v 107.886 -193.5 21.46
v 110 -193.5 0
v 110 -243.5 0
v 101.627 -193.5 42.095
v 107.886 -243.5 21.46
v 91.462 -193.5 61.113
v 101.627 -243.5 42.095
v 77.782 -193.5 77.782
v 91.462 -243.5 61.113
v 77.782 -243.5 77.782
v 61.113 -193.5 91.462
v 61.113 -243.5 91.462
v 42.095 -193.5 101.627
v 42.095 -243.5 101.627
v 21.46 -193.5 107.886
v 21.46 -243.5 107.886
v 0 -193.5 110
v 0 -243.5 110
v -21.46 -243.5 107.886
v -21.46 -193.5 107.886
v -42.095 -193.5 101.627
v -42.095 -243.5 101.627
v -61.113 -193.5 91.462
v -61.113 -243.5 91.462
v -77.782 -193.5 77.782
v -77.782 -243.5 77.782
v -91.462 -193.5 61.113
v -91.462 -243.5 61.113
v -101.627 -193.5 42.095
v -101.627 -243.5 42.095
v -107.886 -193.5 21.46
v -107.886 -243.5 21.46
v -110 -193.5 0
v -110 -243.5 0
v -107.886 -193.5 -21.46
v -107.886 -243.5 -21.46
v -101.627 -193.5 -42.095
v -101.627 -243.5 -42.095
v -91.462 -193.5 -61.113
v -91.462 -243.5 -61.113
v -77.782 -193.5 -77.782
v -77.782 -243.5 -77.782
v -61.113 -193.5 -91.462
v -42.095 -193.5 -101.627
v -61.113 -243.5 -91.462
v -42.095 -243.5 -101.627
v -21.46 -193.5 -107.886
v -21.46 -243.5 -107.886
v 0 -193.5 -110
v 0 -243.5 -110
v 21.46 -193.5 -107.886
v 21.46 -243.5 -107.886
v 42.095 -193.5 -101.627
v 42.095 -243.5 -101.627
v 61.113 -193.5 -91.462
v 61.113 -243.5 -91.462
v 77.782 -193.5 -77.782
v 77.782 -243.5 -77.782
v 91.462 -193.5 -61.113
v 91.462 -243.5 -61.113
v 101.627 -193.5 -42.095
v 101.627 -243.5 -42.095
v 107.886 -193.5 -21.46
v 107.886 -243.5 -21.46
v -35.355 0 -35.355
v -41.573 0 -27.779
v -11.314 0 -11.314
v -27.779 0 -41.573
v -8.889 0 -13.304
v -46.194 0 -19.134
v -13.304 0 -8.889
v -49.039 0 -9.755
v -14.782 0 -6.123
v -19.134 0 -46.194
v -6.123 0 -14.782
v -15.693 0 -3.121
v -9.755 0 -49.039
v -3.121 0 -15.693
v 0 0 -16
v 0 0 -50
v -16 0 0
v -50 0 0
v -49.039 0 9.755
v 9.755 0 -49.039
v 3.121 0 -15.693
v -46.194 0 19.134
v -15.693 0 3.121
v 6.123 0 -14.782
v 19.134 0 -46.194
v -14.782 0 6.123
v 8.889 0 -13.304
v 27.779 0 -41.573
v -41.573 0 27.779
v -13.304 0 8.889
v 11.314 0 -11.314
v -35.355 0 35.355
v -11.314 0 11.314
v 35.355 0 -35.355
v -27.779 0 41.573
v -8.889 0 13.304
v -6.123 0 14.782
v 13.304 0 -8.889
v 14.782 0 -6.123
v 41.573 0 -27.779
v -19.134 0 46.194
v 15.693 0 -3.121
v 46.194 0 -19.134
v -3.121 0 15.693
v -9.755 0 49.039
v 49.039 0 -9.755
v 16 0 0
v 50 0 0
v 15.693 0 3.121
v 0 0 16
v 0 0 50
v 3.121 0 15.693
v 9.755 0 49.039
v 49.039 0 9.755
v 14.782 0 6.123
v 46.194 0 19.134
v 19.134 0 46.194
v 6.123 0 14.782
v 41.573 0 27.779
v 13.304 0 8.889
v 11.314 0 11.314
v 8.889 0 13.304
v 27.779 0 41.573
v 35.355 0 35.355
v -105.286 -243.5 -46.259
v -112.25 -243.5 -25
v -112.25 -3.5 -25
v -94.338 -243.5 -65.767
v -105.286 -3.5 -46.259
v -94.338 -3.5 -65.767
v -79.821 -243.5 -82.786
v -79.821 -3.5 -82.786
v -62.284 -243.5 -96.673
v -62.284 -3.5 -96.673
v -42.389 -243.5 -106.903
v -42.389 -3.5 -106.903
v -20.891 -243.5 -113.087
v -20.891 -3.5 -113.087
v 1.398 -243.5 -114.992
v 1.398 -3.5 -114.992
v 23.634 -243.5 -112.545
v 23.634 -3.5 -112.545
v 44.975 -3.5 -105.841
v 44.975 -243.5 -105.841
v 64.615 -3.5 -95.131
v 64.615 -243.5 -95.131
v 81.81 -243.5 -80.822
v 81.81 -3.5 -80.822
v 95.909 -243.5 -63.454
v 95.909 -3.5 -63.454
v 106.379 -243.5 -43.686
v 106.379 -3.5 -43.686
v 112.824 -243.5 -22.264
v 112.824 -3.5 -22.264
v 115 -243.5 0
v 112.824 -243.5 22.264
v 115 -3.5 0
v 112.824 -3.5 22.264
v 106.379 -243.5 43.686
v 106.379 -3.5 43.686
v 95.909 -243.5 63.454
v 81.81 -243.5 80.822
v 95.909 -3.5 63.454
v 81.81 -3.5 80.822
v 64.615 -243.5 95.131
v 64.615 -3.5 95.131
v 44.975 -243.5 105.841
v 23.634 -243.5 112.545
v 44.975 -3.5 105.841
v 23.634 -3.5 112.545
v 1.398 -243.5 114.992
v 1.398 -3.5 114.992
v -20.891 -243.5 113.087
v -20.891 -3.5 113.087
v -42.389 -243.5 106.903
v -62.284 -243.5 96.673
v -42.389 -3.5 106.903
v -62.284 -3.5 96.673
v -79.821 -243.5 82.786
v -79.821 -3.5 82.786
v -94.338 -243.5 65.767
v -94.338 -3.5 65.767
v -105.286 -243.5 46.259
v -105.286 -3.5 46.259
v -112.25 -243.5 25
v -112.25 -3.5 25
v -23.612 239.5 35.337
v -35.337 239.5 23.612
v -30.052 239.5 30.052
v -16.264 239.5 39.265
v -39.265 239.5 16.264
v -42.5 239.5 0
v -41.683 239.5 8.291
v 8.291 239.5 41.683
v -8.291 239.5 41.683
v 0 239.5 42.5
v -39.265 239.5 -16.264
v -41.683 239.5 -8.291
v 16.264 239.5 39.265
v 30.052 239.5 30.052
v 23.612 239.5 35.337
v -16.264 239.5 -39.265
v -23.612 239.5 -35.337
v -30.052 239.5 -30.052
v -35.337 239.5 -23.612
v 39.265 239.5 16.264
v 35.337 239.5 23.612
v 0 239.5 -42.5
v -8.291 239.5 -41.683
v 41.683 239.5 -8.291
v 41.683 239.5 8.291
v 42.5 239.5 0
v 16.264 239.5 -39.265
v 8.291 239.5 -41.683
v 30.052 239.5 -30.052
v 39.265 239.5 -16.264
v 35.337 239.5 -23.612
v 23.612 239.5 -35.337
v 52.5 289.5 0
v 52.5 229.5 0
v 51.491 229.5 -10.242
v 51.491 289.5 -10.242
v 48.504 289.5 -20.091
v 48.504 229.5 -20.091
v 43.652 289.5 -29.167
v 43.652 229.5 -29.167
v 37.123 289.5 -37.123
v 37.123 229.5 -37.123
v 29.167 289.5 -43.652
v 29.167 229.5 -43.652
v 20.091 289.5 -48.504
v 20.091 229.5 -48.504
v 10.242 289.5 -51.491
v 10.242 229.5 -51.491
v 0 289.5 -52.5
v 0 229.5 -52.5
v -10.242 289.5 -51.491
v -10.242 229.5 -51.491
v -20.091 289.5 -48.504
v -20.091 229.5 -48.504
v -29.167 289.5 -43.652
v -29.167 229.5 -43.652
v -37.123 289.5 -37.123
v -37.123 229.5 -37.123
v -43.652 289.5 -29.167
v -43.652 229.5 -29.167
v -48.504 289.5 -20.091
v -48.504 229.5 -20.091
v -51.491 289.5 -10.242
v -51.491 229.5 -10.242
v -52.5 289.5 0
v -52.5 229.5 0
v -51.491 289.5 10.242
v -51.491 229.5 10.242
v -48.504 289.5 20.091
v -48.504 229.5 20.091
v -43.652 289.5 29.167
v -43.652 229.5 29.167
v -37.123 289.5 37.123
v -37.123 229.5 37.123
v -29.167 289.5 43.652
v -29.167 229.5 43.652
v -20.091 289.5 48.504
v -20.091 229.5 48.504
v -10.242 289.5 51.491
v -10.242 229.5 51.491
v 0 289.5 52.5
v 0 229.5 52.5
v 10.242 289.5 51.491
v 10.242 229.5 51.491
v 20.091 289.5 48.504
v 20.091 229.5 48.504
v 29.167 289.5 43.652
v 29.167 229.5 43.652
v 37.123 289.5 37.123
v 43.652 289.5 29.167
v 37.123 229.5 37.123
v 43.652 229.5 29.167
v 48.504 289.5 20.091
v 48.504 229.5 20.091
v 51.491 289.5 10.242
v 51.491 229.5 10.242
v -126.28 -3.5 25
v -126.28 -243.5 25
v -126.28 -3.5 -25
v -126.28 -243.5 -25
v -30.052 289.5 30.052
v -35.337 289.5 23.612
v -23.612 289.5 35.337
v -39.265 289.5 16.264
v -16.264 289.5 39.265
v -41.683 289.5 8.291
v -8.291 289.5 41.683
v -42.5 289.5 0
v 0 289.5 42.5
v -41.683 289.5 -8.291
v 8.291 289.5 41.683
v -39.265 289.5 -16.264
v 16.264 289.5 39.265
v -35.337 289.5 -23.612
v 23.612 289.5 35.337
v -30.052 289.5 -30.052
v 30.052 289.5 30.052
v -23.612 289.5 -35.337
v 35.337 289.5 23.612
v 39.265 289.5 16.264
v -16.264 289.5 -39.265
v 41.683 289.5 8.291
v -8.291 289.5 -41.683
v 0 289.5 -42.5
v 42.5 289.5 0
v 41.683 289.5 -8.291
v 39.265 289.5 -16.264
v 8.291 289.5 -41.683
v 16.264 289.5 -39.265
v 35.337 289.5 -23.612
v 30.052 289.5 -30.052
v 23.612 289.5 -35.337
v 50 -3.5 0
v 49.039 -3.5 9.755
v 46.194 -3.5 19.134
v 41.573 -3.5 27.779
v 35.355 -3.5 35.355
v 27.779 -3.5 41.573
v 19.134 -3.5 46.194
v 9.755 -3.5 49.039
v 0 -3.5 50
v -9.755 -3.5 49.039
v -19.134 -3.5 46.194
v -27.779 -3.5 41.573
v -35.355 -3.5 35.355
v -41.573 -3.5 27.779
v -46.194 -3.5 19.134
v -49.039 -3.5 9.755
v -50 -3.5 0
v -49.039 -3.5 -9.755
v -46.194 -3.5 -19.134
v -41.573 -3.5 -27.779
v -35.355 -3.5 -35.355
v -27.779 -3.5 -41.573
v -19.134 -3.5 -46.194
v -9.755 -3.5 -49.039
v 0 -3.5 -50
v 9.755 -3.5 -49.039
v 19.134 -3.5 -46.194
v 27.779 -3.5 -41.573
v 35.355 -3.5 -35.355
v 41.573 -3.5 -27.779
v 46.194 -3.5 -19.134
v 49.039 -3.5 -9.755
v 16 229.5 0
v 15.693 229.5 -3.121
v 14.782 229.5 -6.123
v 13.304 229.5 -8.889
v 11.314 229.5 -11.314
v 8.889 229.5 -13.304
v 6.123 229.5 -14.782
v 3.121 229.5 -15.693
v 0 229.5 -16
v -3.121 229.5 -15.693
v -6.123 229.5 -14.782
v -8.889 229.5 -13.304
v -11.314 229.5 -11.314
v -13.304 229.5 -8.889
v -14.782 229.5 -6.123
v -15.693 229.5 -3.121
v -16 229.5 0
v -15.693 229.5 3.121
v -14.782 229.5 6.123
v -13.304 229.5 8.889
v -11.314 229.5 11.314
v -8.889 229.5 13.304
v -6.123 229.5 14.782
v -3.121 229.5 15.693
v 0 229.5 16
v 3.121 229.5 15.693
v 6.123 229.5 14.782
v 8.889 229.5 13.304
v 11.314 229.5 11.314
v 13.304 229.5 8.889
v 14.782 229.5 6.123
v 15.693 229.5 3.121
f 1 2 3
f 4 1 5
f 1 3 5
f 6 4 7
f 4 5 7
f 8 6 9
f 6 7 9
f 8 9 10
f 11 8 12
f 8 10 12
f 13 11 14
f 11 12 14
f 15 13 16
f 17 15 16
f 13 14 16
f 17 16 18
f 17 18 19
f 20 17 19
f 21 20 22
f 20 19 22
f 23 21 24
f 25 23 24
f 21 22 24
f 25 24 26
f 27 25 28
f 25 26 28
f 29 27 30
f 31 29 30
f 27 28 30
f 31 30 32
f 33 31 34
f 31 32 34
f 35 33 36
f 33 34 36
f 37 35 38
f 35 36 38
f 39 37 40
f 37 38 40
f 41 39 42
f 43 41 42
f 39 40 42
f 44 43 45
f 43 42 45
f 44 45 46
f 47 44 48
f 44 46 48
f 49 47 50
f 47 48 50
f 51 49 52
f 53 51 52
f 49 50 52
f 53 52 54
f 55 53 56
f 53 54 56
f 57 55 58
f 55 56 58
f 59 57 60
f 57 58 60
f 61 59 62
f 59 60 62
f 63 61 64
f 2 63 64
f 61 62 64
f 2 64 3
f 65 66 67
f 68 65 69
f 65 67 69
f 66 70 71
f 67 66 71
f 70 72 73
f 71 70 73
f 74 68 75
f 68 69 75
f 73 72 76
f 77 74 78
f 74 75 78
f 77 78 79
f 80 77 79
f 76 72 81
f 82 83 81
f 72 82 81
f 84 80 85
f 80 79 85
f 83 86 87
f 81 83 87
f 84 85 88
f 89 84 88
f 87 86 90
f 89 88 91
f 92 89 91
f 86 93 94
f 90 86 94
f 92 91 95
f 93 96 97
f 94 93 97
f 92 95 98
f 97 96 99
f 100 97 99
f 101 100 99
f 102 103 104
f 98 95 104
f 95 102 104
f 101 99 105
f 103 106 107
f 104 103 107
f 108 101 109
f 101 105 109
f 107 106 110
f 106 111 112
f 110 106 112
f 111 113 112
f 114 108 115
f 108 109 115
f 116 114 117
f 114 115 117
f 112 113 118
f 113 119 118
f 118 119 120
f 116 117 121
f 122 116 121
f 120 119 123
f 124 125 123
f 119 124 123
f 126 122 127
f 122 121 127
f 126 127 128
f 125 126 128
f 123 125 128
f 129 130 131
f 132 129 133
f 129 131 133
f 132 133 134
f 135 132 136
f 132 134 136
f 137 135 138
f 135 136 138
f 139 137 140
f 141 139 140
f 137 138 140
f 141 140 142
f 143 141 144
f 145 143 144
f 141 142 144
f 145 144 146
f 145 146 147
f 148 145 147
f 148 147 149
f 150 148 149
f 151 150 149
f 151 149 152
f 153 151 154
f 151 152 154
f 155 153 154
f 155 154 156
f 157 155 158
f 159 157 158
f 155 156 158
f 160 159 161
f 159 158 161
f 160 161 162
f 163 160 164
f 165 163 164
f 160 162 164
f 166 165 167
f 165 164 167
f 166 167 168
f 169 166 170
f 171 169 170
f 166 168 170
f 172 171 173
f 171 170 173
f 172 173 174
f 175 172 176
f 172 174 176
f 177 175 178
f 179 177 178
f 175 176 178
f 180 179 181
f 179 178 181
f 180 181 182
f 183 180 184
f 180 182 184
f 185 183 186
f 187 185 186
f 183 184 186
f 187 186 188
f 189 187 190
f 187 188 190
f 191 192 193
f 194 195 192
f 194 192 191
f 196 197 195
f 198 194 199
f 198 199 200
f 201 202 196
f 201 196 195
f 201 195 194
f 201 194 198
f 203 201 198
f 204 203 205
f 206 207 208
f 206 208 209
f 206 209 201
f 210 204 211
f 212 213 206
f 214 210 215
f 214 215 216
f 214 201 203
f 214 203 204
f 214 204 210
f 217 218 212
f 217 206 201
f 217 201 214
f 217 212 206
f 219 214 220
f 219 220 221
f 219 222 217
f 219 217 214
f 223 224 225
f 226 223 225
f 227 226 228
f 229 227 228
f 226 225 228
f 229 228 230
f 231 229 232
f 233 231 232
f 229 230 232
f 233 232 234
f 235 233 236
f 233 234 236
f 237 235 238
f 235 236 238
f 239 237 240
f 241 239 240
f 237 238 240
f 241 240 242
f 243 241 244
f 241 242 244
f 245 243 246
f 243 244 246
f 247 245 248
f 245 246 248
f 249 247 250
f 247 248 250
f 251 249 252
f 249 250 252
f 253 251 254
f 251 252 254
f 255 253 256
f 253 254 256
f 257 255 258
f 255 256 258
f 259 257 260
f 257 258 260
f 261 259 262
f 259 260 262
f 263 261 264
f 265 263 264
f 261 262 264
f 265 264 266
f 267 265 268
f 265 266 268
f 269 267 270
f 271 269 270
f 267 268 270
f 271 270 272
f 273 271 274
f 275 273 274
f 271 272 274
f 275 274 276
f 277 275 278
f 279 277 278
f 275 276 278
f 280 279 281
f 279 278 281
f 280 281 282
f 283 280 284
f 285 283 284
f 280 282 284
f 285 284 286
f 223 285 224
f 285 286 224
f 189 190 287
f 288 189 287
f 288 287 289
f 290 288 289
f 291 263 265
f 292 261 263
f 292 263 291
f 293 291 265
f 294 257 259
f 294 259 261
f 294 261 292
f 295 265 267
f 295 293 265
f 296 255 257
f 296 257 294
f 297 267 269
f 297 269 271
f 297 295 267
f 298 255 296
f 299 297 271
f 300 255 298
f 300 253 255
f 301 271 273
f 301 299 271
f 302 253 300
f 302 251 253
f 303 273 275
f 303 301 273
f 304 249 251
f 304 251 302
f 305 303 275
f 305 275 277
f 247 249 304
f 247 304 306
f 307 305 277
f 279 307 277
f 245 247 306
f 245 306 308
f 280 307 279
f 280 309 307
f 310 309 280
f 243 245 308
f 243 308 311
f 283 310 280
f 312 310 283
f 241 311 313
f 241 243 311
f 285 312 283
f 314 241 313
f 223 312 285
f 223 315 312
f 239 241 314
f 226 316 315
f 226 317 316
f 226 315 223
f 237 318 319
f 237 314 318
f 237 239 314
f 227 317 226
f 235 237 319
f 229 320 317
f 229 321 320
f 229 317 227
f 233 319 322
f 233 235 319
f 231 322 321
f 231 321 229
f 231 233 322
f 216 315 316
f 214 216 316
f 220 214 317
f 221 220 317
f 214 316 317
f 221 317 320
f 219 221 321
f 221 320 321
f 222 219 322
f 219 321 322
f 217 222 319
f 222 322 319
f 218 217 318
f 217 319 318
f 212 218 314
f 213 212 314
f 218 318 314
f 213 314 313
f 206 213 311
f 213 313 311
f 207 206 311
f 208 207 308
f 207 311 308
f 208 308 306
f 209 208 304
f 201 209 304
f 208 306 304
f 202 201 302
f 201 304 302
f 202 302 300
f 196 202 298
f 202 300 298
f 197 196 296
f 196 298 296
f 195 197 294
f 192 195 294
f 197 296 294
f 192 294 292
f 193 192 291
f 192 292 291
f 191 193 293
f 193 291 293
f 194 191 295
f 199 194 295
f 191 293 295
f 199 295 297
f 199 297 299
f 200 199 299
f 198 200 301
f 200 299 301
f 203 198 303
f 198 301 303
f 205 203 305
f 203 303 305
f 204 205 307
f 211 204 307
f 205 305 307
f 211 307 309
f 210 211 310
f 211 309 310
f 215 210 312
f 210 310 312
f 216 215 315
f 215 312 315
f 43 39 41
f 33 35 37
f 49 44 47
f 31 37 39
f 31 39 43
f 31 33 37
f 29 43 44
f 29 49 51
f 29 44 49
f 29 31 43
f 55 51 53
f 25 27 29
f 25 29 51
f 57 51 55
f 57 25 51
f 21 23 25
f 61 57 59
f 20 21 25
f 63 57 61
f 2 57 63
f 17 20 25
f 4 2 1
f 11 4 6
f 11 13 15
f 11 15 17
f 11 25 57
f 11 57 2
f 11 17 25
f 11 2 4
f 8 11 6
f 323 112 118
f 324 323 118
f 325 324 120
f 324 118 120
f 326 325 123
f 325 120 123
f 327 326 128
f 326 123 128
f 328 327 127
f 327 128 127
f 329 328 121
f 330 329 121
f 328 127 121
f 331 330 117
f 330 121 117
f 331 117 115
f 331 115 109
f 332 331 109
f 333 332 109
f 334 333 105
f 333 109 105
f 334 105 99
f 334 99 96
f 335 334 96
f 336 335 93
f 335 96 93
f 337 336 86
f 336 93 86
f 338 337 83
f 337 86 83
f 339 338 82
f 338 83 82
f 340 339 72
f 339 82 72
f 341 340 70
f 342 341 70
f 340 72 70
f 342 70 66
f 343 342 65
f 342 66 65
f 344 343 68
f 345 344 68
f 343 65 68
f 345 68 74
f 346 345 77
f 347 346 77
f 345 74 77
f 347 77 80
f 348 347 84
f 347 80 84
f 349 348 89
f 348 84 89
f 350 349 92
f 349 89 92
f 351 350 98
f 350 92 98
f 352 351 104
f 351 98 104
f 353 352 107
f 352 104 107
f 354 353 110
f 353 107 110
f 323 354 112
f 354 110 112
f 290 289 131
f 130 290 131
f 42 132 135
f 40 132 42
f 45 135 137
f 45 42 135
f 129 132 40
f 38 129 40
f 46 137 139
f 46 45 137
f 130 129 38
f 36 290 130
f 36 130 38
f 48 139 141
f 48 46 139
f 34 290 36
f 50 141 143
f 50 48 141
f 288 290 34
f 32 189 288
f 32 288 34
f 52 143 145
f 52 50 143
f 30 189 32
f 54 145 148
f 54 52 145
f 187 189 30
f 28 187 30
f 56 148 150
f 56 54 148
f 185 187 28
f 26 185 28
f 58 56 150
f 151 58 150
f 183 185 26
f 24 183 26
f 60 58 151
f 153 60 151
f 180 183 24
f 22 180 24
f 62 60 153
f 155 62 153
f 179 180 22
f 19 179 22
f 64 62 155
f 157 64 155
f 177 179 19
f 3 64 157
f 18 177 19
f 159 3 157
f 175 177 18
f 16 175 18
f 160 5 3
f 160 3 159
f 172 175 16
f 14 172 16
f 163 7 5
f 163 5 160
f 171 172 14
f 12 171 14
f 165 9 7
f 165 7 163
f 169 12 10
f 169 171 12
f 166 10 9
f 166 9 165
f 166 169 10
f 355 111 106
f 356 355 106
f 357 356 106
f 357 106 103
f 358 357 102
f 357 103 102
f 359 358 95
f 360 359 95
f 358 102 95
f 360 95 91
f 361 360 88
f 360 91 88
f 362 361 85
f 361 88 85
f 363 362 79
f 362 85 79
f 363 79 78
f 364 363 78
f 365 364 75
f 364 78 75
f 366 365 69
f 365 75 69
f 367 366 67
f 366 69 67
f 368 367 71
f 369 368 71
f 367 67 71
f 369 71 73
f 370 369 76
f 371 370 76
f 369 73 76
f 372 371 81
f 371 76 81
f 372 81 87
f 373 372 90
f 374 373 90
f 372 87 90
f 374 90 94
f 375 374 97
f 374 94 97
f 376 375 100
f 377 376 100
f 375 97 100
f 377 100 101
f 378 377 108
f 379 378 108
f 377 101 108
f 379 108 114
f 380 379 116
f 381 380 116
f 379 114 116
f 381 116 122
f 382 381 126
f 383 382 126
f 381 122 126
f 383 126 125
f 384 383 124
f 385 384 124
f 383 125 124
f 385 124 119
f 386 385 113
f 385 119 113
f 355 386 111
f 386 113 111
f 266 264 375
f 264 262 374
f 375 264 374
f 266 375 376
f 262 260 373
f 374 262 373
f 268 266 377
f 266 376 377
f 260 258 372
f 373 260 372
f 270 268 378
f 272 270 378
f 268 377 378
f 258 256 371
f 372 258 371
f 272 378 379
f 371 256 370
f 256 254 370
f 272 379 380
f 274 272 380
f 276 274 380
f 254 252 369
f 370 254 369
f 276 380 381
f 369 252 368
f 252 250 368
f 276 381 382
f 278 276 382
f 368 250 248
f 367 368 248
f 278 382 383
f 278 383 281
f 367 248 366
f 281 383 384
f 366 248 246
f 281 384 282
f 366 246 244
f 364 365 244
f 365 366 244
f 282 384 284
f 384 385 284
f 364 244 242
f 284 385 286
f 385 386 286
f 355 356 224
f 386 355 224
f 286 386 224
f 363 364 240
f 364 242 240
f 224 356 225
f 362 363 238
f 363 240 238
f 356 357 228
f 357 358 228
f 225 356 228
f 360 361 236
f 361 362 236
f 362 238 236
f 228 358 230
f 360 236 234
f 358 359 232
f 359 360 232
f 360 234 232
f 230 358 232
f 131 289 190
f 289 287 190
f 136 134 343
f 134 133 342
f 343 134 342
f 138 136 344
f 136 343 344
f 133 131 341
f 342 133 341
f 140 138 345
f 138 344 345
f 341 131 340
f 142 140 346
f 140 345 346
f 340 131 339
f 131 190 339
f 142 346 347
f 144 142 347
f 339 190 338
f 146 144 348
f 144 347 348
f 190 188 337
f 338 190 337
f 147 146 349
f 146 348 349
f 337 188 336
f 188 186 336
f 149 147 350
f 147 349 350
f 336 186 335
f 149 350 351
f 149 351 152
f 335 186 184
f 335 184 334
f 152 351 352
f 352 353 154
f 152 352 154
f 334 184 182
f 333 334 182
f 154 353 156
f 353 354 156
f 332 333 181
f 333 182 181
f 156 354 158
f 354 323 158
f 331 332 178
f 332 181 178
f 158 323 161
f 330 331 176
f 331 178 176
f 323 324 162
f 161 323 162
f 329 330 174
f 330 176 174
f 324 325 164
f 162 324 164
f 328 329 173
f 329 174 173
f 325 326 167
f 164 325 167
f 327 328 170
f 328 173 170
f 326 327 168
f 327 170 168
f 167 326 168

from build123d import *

# Parameters (mm, degrees)
SKETCH1_R           = 16
BOSS_EXTRUDE1_DEPTH = 229.5
SKETCH2_R           = 52.5
BOSS_EXTRUDE2_DEPTH = 60
SKETCH3_R           = 42.5
CUT_EXTRUDE1_DEPTH  = 50
SKETCH6_R           = 50
BOSS_EXTRUDE4_DEPTH = 3.5
BOSS_EXTRUDE5_DEPTH = 240
SKETCH8_R           = 110
CUT_EXTRUDE3_DEPTH  = 50


with BuildPart() as part:
    # Sketch1 → Boss-Extrude1 (new body)
    with BuildSketch(Plane(origin=(0, 0, 0), x_dir=(1, 0, 0), z_dir=(0, 1, 0))):
        Circle(SKETCH1_R)
    extrude(amount=BOSS_EXTRUDE1_DEPTH)

    # Sketch2 → Boss-Extrude2 (add)
    with BuildSketch(Plane(origin=(0, 229.5, 0), x_dir=(1, 0, 0), z_dir=(0, 1, 0))):
        Circle(SKETCH2_R)
    extrude(amount=BOSS_EXTRUDE2_DEPTH)

    # Sketch3 → Cut-Extrude1 (cut)
    with BuildSketch(Plane(origin=(0, 289.5, 0), x_dir=(1, 0, 0), z_dir=(0, 1, 0))):
        Circle(SKETCH3_R)
    extrude(amount=-CUT_EXTRUDE1_DEPTH, mode=Mode.SUBTRACT)

    # Sketch6 → Boss-Extrude4 (add)
    with BuildSketch(Plane.XZ):
        Circle(SKETCH6_R)
    extrude(amount=BOSS_EXTRUDE4_DEPTH)

    # Sketch7 → Boss-Extrude5 (add)
    with BuildSketch(Plane.XZ.offset(3.5)):
        with BuildLine():
            Line((-126.279721603, -25), (-112.249721603, -25))
            ThreePointArc((-112.249721603, -25), (115, 0), (-112.249721603, 25))
            Line((-112.249721603, 25), (-126.279721603, 25))
            Line((-126.279721603, 25), (-126.279721603, -25))
        make_face()
    extrude(amount=BOSS_EXTRUDE5_DEPTH)

    # Sketch8 → Cut-Extrude3 (cut)
    with BuildSketch(Plane.XZ.offset(243.5)):
        Circle(SKETCH8_R)
    extrude(amount=-CUT_EXTRUDE3_DEPTH, mode=Mode.SUBTRACT)


solid = part.part
